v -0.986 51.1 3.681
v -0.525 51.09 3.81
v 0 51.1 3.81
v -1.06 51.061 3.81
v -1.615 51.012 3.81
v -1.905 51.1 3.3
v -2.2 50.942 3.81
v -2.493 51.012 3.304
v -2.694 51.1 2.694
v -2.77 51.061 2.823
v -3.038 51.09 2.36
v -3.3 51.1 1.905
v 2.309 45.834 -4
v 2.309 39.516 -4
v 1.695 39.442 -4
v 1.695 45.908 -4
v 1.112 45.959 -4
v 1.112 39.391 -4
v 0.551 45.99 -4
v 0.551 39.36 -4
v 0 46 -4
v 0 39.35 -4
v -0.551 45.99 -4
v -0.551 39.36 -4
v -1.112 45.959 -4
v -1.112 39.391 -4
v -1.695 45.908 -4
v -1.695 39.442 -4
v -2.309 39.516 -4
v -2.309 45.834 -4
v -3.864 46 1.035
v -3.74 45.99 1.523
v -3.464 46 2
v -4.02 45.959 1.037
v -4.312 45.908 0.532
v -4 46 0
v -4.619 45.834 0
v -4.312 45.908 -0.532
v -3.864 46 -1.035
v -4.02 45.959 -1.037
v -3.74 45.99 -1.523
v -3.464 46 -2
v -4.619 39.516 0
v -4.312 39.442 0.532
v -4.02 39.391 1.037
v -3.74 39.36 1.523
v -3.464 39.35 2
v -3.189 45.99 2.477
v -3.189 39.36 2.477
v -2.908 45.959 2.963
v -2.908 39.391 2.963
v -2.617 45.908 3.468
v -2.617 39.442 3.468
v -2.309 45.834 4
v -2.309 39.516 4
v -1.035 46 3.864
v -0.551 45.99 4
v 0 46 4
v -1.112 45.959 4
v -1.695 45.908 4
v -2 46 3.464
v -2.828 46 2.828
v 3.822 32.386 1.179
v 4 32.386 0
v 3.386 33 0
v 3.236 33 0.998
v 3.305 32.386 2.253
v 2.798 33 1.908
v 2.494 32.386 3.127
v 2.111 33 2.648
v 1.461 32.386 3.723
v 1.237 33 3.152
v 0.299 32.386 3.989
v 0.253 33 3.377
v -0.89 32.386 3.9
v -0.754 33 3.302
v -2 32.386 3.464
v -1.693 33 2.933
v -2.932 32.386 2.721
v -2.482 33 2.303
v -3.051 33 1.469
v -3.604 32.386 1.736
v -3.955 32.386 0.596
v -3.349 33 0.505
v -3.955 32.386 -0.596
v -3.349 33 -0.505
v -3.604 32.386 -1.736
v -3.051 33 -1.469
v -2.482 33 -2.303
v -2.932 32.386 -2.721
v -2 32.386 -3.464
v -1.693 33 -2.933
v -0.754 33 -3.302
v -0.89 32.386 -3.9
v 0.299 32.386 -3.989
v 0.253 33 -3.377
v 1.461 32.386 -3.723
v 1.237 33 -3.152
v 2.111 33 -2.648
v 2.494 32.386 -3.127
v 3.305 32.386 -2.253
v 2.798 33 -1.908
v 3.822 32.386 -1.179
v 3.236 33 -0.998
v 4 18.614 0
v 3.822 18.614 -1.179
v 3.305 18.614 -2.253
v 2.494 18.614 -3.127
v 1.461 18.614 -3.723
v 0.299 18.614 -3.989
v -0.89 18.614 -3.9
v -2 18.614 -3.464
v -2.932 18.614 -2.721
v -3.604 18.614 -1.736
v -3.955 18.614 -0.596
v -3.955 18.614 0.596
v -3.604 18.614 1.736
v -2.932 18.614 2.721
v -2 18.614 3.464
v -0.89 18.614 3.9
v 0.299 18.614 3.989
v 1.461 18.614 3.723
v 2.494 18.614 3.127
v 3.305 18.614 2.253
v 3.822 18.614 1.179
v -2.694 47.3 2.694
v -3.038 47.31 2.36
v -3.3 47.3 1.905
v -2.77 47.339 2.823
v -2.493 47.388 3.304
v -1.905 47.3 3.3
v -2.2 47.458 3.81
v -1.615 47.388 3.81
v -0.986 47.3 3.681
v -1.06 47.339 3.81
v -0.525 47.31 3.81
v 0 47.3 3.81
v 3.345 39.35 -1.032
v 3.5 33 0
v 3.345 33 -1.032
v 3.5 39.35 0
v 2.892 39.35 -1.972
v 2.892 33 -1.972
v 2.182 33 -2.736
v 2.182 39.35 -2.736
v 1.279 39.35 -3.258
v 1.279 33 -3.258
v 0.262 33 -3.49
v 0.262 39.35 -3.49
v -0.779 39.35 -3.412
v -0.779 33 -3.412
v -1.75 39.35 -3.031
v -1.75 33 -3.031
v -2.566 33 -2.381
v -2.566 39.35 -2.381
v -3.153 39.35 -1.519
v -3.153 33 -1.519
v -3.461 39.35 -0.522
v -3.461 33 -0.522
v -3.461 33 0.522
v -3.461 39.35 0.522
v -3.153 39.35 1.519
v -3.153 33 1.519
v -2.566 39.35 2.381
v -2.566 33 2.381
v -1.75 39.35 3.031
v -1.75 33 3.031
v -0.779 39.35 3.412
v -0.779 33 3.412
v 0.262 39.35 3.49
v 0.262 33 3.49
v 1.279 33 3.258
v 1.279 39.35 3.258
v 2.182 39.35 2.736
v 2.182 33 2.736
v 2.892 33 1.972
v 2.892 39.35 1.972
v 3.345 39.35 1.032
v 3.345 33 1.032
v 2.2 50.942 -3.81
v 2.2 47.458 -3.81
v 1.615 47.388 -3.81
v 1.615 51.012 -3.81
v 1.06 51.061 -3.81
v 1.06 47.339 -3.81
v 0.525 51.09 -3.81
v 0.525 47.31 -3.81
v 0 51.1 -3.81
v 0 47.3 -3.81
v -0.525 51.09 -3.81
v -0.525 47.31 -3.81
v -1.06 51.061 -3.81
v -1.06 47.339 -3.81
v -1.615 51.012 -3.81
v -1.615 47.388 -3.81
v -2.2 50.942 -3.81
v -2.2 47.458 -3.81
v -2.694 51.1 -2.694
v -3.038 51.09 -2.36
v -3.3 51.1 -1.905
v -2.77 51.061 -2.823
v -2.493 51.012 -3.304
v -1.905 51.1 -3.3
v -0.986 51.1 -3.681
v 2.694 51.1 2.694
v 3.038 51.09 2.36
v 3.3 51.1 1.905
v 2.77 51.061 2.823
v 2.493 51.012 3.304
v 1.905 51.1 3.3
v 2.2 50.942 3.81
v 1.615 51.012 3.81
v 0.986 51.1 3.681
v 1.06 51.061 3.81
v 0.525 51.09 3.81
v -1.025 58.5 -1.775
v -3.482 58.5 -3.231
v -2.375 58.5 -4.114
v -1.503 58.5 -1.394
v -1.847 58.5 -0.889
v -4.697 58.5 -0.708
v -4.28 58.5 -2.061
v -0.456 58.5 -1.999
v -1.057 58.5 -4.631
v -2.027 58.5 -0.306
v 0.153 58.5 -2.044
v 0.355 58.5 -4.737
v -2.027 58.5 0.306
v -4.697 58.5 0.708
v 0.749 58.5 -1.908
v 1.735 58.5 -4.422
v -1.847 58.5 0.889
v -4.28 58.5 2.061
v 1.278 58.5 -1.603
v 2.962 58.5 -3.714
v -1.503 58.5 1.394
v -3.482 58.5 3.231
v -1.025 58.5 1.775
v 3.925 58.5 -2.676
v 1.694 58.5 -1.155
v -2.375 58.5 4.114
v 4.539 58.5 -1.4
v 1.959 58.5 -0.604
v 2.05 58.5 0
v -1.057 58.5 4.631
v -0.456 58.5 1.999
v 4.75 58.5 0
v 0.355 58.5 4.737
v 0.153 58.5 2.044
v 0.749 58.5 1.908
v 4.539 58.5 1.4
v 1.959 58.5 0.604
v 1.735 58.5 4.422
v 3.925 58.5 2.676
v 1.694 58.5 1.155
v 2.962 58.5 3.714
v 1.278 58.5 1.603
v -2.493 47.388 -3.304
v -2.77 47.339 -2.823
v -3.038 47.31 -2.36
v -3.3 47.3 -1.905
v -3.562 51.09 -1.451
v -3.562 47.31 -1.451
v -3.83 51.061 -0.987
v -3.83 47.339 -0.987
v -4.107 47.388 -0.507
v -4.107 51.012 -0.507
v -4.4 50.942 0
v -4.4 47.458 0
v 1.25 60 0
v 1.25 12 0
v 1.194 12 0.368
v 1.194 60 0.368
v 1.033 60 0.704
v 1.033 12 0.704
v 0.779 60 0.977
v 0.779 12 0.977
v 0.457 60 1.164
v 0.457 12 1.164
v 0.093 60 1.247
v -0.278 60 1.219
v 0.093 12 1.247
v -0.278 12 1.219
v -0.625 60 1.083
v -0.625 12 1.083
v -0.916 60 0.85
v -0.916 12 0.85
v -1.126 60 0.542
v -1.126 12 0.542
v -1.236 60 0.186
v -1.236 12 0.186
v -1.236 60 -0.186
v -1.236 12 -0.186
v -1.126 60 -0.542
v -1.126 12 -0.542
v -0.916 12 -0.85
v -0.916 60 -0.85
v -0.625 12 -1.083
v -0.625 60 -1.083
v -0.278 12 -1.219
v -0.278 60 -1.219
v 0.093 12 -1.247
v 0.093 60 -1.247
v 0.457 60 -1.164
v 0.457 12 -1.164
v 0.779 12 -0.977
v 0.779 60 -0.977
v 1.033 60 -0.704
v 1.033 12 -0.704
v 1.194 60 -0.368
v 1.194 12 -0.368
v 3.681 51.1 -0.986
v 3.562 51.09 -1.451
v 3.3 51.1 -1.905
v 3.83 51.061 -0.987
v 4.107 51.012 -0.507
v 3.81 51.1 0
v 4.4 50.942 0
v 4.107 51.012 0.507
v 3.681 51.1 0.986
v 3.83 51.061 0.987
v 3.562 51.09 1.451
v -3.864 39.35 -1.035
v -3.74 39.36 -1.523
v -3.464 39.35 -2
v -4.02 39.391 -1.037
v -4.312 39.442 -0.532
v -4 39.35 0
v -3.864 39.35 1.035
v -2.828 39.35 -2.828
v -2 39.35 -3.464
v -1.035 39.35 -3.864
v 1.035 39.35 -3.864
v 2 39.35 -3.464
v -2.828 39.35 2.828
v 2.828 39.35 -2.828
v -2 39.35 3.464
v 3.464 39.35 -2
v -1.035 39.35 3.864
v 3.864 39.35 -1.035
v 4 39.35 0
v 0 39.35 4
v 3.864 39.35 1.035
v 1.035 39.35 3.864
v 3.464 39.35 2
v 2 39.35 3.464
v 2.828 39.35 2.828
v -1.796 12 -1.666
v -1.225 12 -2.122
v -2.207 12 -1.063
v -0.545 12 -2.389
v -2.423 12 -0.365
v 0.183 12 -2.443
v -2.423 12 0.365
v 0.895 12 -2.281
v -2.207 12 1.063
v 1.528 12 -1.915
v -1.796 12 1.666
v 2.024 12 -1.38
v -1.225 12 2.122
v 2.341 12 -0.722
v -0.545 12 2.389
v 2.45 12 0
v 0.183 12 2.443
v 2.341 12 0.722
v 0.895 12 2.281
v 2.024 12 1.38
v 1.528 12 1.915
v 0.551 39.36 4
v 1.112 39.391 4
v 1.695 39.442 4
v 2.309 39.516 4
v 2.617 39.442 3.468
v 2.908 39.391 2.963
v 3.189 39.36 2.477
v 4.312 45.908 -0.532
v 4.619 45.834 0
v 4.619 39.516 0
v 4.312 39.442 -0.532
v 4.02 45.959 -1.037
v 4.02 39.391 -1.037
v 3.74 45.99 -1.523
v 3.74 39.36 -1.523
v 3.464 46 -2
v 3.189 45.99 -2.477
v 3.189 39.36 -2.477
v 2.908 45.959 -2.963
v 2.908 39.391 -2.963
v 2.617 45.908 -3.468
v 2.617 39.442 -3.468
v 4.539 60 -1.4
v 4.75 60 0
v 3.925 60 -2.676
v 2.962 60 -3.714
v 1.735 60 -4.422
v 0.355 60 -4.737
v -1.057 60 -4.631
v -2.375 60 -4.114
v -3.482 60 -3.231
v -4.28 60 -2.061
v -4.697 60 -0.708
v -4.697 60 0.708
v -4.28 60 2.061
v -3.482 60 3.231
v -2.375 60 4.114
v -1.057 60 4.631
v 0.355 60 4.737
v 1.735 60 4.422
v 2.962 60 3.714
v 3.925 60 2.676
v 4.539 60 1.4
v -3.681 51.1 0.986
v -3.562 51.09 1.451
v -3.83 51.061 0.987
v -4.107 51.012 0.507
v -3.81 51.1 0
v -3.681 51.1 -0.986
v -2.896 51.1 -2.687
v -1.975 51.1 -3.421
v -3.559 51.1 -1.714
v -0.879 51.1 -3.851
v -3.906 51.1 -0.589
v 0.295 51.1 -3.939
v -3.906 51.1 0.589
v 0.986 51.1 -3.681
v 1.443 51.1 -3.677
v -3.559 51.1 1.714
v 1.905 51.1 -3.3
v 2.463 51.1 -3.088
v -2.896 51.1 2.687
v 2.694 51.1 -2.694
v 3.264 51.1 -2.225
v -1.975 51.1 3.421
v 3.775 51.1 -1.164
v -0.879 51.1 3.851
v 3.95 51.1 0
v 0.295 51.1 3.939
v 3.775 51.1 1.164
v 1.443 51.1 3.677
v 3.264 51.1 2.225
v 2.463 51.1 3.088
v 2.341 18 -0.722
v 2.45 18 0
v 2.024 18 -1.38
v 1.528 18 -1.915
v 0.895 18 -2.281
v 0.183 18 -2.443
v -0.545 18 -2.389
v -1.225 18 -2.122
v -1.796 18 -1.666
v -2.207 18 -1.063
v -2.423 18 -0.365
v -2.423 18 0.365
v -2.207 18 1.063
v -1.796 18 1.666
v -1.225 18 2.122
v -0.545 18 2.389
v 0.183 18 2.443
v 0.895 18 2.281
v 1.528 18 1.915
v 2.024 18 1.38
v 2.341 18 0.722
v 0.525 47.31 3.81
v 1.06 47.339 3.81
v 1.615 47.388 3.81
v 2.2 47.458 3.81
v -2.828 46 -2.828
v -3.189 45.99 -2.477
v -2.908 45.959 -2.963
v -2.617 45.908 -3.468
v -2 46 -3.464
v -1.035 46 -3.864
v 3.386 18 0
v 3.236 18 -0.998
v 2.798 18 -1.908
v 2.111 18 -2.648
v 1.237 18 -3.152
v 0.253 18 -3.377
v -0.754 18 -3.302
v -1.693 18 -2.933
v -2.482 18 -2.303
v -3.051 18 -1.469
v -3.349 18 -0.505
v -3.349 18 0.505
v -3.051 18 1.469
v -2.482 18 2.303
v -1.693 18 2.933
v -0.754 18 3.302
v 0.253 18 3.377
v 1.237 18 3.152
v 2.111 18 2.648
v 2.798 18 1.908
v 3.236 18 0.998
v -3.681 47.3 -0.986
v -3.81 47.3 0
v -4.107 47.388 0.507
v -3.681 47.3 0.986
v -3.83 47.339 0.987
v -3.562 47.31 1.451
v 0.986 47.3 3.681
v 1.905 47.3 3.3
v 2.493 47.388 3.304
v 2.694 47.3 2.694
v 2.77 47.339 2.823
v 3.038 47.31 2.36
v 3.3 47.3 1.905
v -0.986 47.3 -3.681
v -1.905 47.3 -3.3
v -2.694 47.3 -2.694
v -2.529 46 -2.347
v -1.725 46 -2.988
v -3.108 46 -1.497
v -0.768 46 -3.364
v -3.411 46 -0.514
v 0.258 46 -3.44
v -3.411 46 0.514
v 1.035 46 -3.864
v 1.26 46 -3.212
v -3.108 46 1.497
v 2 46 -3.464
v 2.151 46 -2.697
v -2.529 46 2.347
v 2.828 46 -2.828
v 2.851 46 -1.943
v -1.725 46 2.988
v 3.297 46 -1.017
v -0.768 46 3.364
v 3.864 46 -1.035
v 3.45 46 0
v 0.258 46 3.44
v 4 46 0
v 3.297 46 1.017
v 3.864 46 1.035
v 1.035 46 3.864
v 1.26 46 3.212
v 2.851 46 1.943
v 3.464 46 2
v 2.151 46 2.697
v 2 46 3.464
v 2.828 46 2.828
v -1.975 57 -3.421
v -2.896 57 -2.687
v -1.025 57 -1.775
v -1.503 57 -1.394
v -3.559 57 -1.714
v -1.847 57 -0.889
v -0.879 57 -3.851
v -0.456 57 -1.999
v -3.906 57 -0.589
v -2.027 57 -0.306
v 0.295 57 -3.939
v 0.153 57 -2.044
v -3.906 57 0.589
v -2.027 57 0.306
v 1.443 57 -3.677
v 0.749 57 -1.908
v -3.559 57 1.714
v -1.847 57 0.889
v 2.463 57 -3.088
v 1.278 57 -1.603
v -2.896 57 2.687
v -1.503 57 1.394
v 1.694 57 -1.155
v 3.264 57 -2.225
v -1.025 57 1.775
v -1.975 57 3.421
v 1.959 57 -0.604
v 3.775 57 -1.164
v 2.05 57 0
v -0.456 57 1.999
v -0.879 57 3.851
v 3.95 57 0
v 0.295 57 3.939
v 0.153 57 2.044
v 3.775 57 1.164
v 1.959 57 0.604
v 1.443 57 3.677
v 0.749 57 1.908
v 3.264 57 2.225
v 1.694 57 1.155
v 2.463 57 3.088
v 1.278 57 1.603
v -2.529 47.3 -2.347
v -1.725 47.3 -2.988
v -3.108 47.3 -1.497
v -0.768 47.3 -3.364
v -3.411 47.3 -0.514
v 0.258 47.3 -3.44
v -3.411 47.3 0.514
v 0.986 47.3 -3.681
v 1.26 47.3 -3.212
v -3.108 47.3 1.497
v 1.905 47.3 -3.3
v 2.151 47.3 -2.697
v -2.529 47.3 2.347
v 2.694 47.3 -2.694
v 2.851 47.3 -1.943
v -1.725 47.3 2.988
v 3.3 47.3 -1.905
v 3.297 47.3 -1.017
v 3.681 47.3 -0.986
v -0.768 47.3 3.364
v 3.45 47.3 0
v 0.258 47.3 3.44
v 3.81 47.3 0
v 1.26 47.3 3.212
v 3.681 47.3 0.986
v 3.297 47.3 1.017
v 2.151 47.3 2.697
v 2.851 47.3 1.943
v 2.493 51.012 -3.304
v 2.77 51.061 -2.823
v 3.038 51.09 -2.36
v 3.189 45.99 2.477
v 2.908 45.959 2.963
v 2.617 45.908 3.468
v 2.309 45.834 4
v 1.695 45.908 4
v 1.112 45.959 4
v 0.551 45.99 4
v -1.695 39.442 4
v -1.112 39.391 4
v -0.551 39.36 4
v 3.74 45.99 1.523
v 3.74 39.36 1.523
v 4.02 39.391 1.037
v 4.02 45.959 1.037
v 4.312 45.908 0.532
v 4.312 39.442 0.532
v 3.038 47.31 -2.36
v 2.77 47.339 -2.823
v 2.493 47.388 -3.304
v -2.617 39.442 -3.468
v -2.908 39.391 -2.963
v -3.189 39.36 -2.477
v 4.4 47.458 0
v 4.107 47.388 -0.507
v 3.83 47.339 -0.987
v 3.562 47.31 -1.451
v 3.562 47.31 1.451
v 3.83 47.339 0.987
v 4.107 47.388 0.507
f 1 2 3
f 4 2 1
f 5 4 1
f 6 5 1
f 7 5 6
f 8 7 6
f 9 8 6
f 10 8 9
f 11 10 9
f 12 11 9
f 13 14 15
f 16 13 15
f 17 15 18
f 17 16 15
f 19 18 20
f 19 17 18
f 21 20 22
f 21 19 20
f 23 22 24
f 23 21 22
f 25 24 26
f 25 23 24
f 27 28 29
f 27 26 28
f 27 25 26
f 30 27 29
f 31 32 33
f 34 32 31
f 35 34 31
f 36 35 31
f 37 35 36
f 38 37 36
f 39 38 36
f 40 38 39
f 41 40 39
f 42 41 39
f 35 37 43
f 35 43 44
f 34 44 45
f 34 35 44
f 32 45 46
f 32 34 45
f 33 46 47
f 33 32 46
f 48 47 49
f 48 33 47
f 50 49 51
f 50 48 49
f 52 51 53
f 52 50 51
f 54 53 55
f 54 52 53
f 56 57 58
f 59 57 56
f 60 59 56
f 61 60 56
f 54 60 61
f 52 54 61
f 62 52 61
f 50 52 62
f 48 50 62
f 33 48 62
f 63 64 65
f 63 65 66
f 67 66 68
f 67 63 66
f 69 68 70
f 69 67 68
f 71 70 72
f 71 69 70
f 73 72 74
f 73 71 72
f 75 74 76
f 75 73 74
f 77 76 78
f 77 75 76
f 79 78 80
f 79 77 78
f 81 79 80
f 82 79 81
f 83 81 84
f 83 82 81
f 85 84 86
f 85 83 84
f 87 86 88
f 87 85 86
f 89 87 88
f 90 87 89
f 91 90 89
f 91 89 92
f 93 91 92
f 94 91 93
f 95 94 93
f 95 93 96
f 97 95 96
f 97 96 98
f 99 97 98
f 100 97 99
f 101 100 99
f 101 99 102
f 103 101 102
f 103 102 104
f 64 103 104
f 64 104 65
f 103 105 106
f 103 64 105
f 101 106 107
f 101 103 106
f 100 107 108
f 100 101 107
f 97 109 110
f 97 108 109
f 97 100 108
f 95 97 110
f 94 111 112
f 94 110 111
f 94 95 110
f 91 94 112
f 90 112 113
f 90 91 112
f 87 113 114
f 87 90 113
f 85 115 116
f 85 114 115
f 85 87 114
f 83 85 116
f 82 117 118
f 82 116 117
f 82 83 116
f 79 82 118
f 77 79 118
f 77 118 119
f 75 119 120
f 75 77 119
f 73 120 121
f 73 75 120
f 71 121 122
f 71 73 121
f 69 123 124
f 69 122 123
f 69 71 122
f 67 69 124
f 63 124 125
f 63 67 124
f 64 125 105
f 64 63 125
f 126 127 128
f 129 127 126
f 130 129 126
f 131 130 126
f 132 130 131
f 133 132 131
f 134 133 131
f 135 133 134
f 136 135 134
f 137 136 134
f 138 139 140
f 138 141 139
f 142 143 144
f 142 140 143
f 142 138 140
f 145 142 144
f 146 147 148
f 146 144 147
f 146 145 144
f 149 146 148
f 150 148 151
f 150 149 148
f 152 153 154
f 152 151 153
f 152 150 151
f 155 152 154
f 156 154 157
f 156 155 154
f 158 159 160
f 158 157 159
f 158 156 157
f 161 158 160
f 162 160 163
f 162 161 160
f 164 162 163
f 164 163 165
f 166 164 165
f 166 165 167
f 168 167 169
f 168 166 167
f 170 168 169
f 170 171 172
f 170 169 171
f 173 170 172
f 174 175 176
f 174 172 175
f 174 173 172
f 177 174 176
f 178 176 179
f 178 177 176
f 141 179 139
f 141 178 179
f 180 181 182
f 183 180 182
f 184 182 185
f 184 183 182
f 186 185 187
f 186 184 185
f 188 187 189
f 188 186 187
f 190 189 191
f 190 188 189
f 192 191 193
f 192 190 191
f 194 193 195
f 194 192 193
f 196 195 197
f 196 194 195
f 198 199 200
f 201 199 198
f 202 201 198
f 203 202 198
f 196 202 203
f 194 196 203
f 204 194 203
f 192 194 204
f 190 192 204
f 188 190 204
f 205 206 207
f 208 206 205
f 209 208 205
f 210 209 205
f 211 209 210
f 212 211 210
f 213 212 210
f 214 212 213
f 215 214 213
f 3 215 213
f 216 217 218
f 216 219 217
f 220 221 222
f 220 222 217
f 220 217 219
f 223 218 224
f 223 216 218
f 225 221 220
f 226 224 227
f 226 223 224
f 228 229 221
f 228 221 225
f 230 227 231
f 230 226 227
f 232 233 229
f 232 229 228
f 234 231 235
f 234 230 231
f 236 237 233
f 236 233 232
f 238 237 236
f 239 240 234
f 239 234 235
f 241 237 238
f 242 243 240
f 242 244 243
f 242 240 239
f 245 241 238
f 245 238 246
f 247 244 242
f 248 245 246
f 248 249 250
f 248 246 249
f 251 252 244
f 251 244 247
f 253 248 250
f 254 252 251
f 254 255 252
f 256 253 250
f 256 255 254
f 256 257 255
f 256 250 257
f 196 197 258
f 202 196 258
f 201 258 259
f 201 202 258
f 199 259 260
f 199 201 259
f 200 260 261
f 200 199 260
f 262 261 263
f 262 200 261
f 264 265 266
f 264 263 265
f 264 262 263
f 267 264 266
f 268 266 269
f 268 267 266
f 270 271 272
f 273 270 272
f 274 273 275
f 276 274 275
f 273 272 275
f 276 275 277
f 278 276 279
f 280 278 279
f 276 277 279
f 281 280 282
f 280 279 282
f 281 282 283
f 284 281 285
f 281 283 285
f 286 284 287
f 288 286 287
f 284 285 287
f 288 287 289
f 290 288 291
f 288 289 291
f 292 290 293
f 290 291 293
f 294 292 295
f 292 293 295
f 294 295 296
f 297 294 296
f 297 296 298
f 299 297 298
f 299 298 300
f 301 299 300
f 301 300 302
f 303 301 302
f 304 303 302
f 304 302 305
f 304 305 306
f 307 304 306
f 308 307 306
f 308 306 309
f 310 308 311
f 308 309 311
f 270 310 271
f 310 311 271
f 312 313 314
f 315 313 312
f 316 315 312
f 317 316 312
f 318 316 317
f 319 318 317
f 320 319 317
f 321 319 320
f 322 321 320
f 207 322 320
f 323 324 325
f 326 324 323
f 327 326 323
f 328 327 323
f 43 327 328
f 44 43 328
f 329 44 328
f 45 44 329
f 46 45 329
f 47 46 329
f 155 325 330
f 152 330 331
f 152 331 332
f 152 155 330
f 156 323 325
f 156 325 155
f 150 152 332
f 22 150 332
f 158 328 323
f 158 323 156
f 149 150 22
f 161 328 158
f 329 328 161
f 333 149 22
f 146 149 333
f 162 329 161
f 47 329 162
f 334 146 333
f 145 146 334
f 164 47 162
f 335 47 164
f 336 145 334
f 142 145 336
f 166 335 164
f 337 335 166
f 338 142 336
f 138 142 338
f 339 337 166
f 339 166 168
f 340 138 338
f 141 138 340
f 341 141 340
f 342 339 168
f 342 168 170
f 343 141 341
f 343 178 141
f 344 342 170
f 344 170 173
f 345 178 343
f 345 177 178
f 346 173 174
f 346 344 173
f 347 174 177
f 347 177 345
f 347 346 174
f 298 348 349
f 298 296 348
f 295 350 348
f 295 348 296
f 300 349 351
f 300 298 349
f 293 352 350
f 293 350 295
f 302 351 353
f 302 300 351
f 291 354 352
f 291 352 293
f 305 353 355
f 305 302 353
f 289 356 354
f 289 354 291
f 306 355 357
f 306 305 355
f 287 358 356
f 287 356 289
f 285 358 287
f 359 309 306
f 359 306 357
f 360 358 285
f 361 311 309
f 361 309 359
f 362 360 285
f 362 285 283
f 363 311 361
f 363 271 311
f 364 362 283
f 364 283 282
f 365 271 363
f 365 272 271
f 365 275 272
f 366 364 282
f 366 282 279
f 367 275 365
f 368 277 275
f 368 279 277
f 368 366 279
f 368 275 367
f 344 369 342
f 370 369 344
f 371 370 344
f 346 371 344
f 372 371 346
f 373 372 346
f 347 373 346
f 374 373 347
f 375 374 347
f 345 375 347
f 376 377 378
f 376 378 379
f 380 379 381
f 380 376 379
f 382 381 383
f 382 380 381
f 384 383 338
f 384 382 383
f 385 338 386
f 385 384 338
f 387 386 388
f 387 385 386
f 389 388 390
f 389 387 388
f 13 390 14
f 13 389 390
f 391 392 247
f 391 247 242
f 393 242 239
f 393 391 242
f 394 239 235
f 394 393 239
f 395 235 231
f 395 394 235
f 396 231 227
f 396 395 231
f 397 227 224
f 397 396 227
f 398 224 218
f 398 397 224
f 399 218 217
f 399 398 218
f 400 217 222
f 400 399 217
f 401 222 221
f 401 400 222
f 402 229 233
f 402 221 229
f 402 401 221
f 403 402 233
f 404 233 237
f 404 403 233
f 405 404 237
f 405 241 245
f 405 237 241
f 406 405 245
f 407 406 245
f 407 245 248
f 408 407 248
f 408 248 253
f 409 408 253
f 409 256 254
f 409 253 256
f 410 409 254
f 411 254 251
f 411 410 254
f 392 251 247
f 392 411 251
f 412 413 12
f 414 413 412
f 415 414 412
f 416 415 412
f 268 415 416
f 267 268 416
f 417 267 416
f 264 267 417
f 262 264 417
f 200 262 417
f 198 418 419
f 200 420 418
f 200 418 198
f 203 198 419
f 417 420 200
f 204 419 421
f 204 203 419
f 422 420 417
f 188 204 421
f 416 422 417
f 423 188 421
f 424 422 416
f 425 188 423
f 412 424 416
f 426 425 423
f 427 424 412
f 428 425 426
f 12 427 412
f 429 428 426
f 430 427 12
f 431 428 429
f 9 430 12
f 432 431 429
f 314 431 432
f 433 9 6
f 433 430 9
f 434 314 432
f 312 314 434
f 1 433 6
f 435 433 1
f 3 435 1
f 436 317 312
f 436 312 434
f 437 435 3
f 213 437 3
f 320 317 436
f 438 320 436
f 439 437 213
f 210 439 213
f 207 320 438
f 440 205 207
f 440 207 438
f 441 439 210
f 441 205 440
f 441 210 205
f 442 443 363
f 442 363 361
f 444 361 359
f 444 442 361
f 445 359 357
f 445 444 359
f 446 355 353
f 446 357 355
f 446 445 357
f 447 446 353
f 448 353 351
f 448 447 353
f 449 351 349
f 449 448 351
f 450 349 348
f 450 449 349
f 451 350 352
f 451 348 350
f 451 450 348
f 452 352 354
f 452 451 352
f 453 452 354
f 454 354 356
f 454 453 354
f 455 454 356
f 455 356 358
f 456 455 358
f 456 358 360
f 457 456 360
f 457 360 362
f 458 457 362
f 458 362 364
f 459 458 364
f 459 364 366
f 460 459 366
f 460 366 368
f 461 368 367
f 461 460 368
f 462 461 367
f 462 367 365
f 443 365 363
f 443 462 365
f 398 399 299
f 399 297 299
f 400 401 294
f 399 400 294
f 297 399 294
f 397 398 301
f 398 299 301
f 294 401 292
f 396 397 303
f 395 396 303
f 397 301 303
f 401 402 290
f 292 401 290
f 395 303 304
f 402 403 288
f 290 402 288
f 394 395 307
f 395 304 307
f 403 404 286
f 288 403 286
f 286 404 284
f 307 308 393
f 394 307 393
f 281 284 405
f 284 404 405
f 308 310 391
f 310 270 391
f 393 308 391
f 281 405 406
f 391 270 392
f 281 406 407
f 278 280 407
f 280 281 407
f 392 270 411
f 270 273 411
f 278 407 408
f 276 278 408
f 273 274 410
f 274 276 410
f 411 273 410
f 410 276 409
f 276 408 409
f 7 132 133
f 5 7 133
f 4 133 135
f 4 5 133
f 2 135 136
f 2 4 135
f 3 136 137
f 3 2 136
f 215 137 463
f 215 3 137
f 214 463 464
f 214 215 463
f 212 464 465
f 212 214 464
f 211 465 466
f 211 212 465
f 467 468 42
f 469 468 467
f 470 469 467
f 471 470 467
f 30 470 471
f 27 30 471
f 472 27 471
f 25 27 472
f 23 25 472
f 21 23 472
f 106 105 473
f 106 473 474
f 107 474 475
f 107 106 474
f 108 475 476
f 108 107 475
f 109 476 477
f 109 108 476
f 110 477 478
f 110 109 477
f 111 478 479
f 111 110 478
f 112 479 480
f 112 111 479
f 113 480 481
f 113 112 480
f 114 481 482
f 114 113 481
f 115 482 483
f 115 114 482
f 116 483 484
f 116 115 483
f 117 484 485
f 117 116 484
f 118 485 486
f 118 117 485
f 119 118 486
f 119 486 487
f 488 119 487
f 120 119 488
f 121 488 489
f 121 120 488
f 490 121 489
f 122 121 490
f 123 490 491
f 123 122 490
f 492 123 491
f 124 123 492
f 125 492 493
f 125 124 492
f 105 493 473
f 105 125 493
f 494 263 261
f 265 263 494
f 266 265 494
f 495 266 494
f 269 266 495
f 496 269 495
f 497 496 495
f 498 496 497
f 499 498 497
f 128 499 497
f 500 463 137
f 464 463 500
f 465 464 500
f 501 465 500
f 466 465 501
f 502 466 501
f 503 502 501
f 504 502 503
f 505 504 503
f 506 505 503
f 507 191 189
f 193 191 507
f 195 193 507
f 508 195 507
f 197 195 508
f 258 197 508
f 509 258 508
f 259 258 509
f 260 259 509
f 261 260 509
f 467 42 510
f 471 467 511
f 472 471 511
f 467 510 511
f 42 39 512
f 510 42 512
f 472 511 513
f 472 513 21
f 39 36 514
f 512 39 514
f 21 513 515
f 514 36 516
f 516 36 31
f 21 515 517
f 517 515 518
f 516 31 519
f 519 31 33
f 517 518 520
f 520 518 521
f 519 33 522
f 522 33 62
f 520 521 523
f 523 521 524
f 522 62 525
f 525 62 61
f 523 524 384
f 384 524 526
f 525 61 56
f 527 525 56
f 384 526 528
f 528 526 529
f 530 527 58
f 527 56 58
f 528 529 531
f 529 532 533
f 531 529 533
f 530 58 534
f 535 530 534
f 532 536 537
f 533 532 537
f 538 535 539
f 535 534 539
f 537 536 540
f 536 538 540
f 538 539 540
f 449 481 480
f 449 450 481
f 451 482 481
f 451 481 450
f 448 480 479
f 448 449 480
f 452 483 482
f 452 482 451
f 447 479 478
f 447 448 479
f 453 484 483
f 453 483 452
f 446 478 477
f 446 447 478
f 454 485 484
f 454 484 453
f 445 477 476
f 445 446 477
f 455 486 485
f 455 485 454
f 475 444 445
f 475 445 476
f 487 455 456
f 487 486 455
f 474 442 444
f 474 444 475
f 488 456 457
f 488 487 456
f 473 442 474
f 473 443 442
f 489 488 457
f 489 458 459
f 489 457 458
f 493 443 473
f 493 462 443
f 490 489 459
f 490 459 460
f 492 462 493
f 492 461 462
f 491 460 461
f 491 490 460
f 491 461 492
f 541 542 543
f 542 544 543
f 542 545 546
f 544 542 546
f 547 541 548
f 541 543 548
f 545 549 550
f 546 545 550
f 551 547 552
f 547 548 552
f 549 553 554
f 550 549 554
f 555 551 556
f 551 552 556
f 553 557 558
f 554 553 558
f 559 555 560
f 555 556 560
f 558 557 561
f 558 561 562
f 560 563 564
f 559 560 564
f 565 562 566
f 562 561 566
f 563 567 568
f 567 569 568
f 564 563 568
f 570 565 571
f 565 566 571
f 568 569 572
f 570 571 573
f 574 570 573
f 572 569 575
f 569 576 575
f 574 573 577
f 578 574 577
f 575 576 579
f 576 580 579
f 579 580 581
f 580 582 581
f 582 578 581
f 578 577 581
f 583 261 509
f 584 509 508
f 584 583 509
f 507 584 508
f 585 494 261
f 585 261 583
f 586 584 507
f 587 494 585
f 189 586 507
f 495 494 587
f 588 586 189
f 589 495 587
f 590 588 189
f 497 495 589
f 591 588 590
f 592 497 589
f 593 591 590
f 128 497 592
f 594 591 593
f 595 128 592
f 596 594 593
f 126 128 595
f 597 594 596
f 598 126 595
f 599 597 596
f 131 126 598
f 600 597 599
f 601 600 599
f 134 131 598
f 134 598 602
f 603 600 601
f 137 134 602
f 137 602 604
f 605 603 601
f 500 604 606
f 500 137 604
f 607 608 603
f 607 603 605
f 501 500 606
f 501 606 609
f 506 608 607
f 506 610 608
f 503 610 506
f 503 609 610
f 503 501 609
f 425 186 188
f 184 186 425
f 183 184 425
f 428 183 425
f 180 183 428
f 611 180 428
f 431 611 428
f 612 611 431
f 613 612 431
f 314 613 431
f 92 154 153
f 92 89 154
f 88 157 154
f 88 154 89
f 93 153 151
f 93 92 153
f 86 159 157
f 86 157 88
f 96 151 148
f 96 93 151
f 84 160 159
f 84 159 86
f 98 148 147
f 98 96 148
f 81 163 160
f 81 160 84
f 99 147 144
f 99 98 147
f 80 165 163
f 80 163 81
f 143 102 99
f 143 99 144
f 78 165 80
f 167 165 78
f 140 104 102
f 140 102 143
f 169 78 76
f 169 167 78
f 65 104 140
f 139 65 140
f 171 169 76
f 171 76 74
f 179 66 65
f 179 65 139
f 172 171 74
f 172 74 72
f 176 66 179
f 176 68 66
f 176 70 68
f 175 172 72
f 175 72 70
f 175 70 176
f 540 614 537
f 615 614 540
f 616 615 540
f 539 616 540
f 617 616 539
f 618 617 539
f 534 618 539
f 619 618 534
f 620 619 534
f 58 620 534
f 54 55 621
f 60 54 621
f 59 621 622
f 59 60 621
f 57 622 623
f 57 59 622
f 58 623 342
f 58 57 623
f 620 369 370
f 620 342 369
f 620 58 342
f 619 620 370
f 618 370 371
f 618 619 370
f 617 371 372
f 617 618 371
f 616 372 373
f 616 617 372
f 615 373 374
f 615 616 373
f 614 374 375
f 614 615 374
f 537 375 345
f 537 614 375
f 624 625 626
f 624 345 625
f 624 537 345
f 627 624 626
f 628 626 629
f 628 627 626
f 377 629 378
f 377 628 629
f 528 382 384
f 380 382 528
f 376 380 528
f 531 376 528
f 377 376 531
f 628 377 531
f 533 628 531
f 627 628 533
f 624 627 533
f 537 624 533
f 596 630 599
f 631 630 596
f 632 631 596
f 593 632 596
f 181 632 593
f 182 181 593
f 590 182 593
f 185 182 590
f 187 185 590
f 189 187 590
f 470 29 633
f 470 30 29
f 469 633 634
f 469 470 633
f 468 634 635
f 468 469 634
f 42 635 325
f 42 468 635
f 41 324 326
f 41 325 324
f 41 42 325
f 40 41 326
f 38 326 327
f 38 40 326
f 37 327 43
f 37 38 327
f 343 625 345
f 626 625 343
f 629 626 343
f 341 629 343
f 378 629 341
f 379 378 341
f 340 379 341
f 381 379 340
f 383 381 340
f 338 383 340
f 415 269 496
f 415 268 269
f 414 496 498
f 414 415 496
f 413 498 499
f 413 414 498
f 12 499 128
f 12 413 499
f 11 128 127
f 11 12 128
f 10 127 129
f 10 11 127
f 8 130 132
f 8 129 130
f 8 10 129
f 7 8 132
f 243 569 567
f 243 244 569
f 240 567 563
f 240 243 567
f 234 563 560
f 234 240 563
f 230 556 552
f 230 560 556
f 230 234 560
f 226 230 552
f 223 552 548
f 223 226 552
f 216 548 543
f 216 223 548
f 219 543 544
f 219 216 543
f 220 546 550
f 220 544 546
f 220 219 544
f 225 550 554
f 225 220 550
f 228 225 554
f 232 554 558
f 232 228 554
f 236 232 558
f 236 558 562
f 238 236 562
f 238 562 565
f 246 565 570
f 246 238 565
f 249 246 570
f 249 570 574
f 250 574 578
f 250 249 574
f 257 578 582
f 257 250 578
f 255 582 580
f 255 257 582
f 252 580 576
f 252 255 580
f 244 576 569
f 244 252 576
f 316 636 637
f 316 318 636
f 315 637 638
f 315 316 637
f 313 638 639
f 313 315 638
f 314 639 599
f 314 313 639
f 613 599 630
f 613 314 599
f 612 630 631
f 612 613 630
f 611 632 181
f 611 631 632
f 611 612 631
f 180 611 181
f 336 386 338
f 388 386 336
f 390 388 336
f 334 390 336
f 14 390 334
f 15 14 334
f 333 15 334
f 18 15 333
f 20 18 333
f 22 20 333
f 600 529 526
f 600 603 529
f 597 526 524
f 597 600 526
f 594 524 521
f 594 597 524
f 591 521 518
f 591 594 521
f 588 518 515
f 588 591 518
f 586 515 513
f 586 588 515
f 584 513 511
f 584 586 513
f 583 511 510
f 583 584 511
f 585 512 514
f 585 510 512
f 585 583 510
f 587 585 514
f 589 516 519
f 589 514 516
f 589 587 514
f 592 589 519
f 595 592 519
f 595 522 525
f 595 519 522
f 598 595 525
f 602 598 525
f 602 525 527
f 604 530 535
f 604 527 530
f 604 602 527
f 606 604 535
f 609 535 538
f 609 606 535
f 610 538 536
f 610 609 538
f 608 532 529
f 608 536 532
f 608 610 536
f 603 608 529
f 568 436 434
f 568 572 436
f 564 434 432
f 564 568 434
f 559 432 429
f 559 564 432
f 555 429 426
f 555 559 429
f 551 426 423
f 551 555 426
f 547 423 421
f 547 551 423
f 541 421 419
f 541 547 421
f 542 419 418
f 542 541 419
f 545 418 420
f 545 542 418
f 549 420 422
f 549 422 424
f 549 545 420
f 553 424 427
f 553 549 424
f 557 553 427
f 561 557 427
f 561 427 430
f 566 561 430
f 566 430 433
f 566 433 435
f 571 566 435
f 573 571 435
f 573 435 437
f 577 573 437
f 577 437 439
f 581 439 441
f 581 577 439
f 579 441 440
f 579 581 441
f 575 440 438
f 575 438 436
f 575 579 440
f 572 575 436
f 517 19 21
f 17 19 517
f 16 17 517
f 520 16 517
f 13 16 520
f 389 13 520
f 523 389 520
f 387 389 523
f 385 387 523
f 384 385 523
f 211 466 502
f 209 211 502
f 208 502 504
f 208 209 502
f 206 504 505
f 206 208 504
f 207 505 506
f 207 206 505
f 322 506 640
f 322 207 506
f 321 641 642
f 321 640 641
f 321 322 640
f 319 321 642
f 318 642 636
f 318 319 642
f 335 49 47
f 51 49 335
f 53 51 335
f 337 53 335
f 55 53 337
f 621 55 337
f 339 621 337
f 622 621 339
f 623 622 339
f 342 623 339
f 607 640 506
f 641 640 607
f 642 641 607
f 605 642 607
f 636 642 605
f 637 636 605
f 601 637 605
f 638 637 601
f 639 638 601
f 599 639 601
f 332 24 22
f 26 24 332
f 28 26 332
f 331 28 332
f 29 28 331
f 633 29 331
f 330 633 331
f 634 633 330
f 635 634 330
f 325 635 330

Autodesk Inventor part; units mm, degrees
sketch "Sketch_9" plane through (0, 0, 0) normal (0, 0, 1) x (1, 0, 0)
  line L0 (0, 12) -> (0, 60)
  line L1 (1.25, 60) -> (1.25, 12)
  line L2 (1.25, 12) -> (2.45, 12)
  line L3 (2.45, 12) -> (2.45, 18)
  line L4 (2.45, 18) -> (3.3865, 18)
  line L5 (3.3865, 18) -> (4, 18.6135)
  line L6 (4, 18.6135) -> (4, 32.3865)
  line L7 (4, 32.3865) -> (3.3865, 33)
  line L8 (3.3865, 33) -> (3.5, 33)
  line L9 (3.5, 33) -> (3.5, 39.35)
  line L10 (3.5, 39.35) -> (4, 39.35)
  line L11 (4, 39.35) -> (6.4, 39.9931)
  line L12 (6.4, 39.9931) -> (6.4, 45.3569)
  line L13 (6.4, 45.3569) -> (4, 46)
  line L14 (4, 46) -> (3.45, 46)
  line L15 (3.45, 46) -> (3.45, 47.3)
  line L16 (3.45, 47.3) -> (3.8105, 47.3)
  line L17 (3.8105, 47.3) -> (6.0968, 47.9126)
  line L18 (6.0968, 47.9126) -> (6.0968, 50.4874)
  line L19 (6.0968, 50.4874) -> (3.8105, 51.1)
  line L20 (3.8105, 51.1) -> (3.95, 51.1)
  line L21 (3.95, 51.1) -> (3.95, 57)
  line L22 (3.95, 57) -> (2.05, 57)
  line L23 (2.05, 57) -> (2.05, 58.5)
  line L24 (2.05, 58.5) -> (4.75, 58.5)
  line L25 (4.75, 58.5) -> (4.75, 60)
  line L26 (4.75, 60) -> (1.25, 60)
revolve "Revolution1" add sketch "Sketch_9" angle 360 about axis through (0, 12, 0) along (0, -1, 0)
thread "Thread1" size "M8x1" class "6g" standard "ISO Metric profile" full length
sketch "Sketch_10" plane through (0, 51.1, 0) normal (0, 1, 0) x (1, 0, 0)
  circle A0 centre (0, 0) radius 8.8
  line L0 (-4.4, 0) -> (-2.2, -3.8105)
  line L1 (-2.2, -3.8105) -> (2.2, -3.8105)
  line L2 (2.2, -3.8105) -> (4.4, 0)
  line L3 (4.4, 0) -> (2.2, 3.8105)
  line L4 (2.2, 3.8105) -> (-2.2, 3.8105)
  line L5 (-2.2, 3.8105) -> (-4.4, 0)
extrude "Extrusion1" cut sketch "Sketch_10" against normal blind 3.8
sketch "Sketch_11" plane through (0, 46, 0) normal (0, 1, 0) x (1, 0, 0)
  circle A0 centre (0, 0) radius 8
  line L0 (-4.6188, 0) -> (-2.3094, -4)
  line L1 (-2.3094, -4) -> (2.3094, -4)
  line L2 (2.3094, -4) -> (4.6188, 0)
  line L3 (4.6188, 0) -> (2.3094, 4)
  line L4 (2.3094, 4) -> (-2.3094, 4)
  line L5 (-2.3094, 4) -> (-4.6188, 0)
extrude "Extrusion2" cut sketch "Sketch_11" against normal blind 6.65
ref_plane "BUFFER_DUMMY_XY" through (0, 0, 0) normal (0, -1, 0) x (1, 0, 0)
ref_plane "BUFFER_DUMMY_YZ" through (0, 0, 0) normal (1, 0, 0) x (0, 0, 1)
ref_plane "BUFFER_DUMMY_ZX" through (0, 0, 0) normal (0, 0, 1) x (0, -1, 0)
ref_plane "BUFFER_NUT1_XY" through (0, 25.5, 0) normal (0, 1, 0) x (1, 0, 0)
ref_plane "BUFFER_NUT1_YZ" through (0, 25.5, 0) normal (1, 0, 0) x (0, 0, -1)
ref_plane "BUFFER_NUT1_ZX" through (0, 25.5, 0) normal (0, 0, -1) x (0, 1, 0)
ref_plane "BUFFER_NUT2_XY" through (0, 25.5, 0) normal (0, 1, 0) x (1, 0, 0)
ref_plane "BUFFER_NUT2_YZ" through (0, 25.5, 0) normal (1, 0, 0) x (0, 0, -1)
ref_plane "BUFFER_NUT2_ZX" through (0, 25.5, 0) normal (0, 0, -1) x (0, 1, 0)
ref_plane "BUFFER_PLATE_XY" through (0, 25.5, 0) normal (0, 1, 0) x (1, 0, 0)
ref_plane "BUFFER_PLATE_YZ" through (0, 25.5, 0) normal (1, 0, 0) x (0, 0, -1)
ref_plane "BUFFER_PLATE_ZX" through (0, 25.5, 0) normal (0, 0, -1) x (0, 1, 0)
properties part number "ZPT08U6-04_B_BUFFER"
